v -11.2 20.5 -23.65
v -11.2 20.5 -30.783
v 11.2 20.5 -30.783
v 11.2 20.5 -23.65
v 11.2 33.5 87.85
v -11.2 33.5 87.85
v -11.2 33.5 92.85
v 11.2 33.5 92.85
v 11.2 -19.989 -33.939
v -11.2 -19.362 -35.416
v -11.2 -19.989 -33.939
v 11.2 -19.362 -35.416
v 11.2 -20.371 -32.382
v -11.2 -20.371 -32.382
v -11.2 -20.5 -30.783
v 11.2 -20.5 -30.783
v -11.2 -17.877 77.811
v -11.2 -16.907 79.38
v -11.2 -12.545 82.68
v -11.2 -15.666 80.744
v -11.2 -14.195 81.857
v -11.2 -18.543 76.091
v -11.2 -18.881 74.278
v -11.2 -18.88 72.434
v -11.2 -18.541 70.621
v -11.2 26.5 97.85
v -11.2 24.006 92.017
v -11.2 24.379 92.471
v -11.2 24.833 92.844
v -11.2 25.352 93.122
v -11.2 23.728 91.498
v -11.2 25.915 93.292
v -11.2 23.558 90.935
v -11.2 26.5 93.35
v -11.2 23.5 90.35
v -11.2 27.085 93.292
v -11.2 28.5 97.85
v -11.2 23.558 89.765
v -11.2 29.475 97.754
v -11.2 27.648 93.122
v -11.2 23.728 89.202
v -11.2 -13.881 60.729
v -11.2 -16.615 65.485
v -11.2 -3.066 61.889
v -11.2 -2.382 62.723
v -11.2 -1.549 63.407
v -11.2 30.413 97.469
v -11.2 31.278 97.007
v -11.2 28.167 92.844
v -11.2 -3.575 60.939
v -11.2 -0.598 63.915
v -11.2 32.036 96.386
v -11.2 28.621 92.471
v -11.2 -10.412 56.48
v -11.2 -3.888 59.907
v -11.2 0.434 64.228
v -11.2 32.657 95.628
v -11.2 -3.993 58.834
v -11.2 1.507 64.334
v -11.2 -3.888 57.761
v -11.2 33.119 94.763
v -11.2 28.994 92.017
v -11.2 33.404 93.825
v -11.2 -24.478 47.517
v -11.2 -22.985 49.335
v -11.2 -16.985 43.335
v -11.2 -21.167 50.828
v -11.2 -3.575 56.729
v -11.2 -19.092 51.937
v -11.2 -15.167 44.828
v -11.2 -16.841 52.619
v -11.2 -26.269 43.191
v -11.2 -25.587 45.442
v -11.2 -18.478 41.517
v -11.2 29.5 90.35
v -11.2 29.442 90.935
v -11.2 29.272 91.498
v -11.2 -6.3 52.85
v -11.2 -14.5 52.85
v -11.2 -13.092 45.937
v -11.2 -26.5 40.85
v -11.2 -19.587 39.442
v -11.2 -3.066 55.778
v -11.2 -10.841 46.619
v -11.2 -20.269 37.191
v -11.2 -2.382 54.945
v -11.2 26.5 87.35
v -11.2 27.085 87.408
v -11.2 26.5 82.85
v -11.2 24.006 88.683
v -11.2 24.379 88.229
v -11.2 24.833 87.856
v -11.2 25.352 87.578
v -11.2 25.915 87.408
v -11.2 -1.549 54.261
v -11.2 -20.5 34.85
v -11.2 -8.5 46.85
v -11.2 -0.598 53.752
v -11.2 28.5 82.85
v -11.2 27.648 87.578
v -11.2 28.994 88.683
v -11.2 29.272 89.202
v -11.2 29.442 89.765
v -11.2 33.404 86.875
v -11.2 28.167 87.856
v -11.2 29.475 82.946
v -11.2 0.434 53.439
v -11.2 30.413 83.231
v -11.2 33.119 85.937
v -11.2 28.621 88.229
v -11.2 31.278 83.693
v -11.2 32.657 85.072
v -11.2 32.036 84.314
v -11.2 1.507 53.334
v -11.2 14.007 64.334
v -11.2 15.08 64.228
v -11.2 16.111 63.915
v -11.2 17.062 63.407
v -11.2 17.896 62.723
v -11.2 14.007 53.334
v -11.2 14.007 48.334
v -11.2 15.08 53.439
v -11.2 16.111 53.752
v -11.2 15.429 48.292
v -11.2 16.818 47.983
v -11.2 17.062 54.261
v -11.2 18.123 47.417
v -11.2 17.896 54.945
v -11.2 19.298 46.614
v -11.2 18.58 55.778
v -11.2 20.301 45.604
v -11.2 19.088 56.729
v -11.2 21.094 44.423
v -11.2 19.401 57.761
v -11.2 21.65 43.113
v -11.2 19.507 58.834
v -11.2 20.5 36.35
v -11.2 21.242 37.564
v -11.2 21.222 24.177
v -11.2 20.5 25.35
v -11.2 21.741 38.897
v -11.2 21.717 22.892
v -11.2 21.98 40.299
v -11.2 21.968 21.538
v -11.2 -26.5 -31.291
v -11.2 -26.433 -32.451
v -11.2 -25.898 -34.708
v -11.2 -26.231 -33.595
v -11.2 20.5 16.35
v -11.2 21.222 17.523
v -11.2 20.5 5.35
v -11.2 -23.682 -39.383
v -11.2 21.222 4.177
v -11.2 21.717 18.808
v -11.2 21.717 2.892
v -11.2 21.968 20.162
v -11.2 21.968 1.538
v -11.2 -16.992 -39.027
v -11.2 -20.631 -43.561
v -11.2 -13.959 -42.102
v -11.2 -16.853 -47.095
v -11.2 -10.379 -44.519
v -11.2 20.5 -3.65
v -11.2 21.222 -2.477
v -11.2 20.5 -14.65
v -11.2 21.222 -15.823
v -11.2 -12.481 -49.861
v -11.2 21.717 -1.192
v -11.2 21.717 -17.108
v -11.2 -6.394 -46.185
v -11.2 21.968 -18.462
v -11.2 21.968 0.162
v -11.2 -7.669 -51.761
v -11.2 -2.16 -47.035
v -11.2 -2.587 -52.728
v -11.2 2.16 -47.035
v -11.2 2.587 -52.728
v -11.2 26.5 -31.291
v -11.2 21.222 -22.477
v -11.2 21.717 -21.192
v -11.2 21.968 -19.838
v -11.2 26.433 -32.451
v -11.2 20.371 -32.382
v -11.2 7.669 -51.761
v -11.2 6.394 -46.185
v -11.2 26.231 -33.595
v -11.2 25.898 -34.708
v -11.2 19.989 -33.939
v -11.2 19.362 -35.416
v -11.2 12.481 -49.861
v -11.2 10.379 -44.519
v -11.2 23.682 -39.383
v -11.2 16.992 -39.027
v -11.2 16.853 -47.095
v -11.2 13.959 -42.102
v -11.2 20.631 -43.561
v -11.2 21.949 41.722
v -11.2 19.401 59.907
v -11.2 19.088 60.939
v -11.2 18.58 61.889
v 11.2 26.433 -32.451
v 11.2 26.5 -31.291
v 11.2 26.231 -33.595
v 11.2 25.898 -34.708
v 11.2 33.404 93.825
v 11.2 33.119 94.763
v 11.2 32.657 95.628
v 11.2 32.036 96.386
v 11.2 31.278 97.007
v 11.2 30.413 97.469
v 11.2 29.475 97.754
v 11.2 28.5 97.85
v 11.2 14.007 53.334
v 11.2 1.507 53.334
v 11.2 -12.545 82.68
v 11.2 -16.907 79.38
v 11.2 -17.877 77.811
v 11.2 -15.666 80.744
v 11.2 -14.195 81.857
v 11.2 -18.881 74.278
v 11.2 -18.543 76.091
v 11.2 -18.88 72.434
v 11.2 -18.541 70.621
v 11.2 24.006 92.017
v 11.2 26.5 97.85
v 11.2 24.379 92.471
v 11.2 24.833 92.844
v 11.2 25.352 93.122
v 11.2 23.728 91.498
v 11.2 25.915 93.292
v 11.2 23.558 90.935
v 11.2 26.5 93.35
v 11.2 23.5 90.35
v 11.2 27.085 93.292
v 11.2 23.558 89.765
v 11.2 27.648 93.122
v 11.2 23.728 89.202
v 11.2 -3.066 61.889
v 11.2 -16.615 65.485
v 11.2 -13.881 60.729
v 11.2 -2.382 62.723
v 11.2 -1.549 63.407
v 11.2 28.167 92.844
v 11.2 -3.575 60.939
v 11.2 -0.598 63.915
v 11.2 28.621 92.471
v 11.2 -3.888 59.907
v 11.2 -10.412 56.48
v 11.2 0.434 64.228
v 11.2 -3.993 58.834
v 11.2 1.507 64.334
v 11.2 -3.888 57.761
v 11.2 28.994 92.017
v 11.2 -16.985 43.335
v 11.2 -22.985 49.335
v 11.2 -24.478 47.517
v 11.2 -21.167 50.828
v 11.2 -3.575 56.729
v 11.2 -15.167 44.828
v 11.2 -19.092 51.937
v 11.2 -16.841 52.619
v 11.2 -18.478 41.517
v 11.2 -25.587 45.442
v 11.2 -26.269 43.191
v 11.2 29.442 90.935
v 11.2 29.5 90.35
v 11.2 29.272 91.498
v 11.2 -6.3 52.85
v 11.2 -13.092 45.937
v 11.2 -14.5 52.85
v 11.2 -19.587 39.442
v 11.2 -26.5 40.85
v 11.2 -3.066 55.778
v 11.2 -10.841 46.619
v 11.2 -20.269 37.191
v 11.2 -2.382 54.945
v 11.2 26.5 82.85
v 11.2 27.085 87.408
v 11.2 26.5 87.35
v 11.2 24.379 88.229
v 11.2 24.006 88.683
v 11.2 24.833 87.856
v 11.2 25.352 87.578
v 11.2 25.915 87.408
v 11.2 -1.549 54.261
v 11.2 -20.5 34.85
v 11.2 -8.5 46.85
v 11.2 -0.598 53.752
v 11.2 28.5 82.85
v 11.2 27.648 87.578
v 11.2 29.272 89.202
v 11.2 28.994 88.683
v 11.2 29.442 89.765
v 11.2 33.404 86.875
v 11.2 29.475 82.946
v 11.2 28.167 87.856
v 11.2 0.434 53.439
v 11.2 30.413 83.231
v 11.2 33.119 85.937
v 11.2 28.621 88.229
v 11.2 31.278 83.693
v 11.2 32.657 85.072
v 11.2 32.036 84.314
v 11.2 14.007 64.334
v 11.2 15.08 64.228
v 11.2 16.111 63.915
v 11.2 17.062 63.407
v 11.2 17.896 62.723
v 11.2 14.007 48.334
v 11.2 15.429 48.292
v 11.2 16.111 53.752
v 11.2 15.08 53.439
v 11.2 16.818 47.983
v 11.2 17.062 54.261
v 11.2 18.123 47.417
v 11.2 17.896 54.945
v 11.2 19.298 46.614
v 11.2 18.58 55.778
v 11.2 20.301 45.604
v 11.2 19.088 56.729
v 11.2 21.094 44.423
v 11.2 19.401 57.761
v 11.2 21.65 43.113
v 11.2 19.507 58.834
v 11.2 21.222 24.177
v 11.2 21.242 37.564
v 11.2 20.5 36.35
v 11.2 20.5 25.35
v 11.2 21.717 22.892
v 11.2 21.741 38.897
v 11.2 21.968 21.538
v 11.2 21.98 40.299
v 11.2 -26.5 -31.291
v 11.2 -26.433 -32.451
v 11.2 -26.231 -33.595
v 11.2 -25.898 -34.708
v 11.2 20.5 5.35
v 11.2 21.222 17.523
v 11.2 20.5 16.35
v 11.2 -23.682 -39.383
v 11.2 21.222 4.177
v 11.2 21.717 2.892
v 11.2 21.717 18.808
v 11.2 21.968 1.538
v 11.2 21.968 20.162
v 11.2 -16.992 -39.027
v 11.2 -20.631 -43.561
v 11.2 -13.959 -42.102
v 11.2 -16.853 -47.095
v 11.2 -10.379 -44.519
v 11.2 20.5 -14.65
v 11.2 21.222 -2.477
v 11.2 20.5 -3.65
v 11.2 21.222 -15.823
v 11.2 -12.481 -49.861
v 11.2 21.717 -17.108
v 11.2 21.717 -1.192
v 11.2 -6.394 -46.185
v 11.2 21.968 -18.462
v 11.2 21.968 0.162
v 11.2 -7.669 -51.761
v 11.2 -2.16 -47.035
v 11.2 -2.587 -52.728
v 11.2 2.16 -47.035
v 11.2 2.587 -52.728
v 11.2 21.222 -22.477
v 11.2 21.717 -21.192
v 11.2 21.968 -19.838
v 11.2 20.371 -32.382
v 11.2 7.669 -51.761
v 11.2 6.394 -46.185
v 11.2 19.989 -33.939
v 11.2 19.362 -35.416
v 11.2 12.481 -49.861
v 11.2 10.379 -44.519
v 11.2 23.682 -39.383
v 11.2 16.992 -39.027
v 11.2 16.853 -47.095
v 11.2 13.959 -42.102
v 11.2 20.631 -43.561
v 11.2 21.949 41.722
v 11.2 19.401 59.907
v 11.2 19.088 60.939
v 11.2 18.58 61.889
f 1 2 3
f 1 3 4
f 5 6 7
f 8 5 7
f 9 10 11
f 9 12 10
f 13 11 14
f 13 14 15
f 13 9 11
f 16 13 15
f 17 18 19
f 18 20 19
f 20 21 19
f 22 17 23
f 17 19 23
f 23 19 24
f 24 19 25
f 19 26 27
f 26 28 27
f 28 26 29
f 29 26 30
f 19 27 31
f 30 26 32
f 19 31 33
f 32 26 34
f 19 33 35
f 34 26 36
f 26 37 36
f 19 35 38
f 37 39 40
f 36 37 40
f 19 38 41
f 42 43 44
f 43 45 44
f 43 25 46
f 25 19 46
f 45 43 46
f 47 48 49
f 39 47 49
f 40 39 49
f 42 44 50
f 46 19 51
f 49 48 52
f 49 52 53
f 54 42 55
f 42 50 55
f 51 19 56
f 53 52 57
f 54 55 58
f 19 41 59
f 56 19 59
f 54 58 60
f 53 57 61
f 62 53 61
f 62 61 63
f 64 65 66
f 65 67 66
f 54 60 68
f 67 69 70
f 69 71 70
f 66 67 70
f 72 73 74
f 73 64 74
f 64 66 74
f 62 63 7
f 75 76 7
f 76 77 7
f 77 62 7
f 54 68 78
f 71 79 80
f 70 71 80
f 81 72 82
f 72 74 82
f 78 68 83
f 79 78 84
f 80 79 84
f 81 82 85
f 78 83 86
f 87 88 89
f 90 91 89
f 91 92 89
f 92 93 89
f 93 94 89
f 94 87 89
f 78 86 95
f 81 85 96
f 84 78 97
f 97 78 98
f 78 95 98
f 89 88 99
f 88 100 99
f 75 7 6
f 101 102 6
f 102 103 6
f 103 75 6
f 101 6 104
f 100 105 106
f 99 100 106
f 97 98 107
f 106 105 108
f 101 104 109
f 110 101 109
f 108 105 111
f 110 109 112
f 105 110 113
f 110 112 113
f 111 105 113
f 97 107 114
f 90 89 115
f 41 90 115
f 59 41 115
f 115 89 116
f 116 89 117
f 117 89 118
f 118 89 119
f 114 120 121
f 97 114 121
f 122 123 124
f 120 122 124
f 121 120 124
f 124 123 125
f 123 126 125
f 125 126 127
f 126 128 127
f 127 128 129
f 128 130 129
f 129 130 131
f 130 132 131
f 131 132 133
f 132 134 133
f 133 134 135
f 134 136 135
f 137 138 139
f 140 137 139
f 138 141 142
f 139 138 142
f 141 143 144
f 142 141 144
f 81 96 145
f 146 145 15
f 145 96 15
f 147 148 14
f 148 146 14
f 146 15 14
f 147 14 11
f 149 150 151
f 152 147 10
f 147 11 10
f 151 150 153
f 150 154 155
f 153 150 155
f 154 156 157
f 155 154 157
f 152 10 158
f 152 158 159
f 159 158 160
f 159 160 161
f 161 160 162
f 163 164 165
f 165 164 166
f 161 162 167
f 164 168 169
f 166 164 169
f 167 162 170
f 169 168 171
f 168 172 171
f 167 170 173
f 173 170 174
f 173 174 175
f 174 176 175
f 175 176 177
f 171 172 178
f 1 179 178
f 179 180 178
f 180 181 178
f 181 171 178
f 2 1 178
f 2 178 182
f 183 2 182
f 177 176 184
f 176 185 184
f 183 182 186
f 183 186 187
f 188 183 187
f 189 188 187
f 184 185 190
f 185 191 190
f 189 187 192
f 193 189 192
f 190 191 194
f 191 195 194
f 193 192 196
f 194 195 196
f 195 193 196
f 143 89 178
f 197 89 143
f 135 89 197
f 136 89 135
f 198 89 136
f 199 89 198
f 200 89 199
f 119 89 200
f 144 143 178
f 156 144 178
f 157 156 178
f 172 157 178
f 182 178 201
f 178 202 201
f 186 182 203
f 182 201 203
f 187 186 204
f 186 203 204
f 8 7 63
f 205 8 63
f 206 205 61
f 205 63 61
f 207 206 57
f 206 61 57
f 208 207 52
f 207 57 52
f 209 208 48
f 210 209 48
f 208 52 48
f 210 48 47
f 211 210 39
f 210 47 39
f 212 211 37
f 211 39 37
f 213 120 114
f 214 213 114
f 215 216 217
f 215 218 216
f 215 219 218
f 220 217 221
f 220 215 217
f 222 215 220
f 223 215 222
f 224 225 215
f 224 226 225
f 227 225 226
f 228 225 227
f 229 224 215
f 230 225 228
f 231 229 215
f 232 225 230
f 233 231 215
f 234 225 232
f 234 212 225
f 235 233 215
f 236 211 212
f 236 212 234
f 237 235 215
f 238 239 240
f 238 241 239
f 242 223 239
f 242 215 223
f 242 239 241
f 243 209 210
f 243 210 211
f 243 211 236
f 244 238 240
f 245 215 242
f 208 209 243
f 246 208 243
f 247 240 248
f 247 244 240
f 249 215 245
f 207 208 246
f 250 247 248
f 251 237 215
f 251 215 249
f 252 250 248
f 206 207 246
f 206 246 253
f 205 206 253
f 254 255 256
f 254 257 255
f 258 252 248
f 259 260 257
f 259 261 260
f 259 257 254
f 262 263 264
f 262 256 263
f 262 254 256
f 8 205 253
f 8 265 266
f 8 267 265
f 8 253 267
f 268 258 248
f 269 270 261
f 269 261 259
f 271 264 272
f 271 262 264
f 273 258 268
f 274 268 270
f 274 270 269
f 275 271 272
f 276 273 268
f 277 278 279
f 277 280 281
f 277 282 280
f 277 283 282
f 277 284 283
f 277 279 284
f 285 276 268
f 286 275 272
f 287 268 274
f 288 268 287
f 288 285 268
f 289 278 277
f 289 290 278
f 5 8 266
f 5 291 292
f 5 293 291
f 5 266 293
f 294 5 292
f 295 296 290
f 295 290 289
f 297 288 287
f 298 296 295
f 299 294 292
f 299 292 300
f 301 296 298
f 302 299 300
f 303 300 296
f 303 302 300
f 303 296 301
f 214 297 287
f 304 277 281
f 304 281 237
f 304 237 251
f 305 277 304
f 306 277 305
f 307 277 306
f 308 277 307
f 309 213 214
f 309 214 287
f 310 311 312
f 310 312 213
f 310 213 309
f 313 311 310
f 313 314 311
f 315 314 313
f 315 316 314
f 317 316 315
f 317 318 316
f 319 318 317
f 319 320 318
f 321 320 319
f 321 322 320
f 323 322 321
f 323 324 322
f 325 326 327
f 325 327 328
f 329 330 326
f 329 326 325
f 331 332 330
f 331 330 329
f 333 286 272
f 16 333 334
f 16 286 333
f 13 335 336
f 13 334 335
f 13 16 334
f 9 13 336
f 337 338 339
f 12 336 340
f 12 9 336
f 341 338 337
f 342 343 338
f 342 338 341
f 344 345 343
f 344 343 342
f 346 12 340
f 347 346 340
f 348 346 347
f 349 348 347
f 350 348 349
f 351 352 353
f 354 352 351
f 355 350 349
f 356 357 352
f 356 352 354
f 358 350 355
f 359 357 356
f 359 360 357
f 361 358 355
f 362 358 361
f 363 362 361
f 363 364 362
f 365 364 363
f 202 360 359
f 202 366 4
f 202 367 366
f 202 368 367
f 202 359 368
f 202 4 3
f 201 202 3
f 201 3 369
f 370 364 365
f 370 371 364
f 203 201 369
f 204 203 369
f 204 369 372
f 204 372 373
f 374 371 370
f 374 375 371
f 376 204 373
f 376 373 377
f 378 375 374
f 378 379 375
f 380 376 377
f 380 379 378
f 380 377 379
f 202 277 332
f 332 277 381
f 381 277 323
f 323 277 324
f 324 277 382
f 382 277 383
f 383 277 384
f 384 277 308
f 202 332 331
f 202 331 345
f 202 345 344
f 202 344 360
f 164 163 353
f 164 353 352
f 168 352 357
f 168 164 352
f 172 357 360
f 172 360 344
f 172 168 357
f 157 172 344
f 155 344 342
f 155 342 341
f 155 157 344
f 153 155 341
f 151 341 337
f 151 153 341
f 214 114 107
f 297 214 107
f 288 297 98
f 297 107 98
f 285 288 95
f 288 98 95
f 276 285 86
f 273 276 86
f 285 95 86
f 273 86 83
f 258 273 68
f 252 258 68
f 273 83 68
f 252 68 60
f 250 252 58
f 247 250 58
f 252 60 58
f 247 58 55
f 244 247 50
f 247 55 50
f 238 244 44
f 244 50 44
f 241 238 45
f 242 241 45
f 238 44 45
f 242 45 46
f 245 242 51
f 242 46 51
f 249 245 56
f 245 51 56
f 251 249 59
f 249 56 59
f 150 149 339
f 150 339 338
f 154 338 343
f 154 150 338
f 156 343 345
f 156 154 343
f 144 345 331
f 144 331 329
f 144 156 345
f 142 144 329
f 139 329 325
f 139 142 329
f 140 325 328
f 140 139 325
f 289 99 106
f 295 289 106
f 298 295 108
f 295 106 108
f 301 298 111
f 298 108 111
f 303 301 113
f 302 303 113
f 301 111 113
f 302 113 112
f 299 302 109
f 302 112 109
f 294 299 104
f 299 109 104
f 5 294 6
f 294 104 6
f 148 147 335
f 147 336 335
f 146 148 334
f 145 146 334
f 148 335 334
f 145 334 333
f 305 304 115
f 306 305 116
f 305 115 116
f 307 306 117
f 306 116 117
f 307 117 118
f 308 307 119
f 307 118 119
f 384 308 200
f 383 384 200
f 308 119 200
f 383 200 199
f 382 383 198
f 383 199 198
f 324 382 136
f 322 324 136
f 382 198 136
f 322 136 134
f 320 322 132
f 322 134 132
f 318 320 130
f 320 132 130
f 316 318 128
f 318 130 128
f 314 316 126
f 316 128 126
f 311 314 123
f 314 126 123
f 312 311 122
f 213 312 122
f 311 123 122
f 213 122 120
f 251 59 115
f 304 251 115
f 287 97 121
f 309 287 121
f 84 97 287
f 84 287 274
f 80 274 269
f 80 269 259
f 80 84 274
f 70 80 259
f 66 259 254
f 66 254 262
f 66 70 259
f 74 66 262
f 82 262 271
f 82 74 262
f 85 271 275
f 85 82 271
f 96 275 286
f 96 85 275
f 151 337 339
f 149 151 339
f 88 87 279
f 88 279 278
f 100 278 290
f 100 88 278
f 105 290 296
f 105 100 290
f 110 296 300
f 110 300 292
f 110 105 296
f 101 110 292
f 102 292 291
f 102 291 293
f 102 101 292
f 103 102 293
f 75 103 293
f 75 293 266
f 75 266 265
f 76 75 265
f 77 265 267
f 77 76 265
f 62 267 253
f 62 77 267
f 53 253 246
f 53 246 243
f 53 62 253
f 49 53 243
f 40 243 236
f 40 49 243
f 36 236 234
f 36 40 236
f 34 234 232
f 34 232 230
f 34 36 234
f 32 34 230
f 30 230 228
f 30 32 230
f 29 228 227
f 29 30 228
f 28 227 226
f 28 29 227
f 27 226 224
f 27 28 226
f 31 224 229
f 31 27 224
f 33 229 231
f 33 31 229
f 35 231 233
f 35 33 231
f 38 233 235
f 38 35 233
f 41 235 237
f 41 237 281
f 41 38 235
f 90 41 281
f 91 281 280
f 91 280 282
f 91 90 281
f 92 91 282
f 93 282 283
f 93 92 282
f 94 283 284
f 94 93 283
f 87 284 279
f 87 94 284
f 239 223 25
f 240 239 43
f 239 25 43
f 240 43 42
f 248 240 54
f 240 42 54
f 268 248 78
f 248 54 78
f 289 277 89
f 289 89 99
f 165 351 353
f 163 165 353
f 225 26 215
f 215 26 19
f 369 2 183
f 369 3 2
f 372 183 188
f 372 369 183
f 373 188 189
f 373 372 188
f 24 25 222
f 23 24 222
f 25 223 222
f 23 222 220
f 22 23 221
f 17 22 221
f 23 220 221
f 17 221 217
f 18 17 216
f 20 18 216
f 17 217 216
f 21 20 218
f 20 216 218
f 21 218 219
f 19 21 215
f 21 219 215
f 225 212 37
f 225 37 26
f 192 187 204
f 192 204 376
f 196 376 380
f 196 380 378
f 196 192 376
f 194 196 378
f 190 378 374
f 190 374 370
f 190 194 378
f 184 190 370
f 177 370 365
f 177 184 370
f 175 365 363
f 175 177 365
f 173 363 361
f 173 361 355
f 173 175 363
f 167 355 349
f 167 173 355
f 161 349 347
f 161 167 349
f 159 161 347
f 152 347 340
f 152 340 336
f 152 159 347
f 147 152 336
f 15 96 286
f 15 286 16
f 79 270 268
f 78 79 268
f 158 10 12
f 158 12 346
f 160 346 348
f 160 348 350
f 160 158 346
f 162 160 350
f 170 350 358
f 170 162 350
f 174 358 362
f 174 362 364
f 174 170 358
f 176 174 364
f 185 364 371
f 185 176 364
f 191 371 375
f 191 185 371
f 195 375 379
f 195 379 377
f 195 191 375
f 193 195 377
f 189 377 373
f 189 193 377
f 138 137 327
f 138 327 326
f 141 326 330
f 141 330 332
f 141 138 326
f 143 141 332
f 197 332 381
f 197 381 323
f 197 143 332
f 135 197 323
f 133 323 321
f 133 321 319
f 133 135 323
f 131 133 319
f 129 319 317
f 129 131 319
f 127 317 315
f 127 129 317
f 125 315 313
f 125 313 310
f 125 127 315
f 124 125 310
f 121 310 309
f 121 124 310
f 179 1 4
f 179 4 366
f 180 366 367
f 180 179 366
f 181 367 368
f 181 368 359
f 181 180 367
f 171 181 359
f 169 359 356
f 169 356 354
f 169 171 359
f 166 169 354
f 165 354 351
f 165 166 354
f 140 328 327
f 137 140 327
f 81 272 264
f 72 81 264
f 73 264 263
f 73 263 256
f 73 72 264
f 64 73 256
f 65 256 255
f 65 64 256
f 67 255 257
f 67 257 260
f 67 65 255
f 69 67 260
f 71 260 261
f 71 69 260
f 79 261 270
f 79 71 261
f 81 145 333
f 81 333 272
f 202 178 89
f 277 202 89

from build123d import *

# Parameters (mm, degrees)
BOSS_EXTRUDE1_DEPTH      = 11.2
BOSS_EXTRUDE1_DEPTH_BACK = 11.2
CUT_EXTRUDE1_START       = -11.2
SKETCH3_R                = 7.5
CUT_EXTRUDE1_DEPTH       = 22.4
FILLET1_R                = 10
CUT_EXTRUDE2_START       = -11.2
CUT_EXTRUDE2_DEPTH       = 22.4
FILLET2_R                = 10
BOSS_EXTRUDE2_START      = -11.2
BOSS_EXTRUDE2_DEPTH      = 22.4
FILLET3_R                = 10
CUT_EXTRUDE3_START       = -11.2
CUT_EXTRUDE3_DEPTH       = 22.4
CUT_EXTRUDE4_START       = -11.2
SKETCH7_R                = 3
CUT_EXTRUDE4_DEPTH       = 22.4


with BuildPart() as part:
    # Sketch2 → Boss-Extrude1 (new, two sides: drawn at the far end of the back side and taken through both)
    with BuildSketch(Plane(origin=(0, 0, 0), x_dir=(0, 0, -1), z_dir=(1, 0, 0)).offset(-BOSS_EXTRUDE1_DEPTH_BACK)):
        with BuildLine():
            Line((-52.85, 26.5), (32.85, 26.5))
            ThreePointArc((32.85, 26.5), (52.85, 0), (32.85, -26.5))
            Line((32.85, -26.5), (-40.85, -26.5))
            ThreePointArc((-40.85, -26.5), (-49.335281374, -22.985281374), (-52.85, -14.5))
            Line((-52.85, -14.5), (-52.85, 26.5))
        make_face()
        with BuildLine():
            Line((32.85, 20.5), (-40.85, 20.5))
            ThreePointArc((-40.85, 20.5), (-45.092640687, 18.742640687), (-46.85, 14.5))
            Line((-46.85, 14.5), (-46.85, -8.5))
            ThreePointArc((-46.85, -8.5), (-43.335281374, -16.985281374), (-34.85, -20.5))
            Line((-34.85, -20.5), (32.85, -20.5))
            ThreePointArc((32.85, -20.5), (47.142020276, 0), (32.85, 20.5))
        make_face(mode=Mode.SUBTRACT)
    extrude(amount=BOSS_EXTRUDE1_DEPTH + BOSS_EXTRUDE1_DEPTH_BACK)

    # Sketch3 → Cut-Extrude1 (cut)
    with BuildSketch(Plane(origin=(0, 0, 0), x_dir=(0, 0, -1), z_dir=(1, 0, 0)).offset(CUT_EXTRUDE1_START)):
        with Locations((-40.85, 14.5)):
            Circle(SKETCH3_R)
        with Locations((-20.85, 14.5)):
            Circle(SKETCH3_R)
        with Locations((-0.85, 14.5)):
            Circle(SKETCH3_R)
        with Locations((19.15, 14.5)):
            Circle(SKETCH3_R)
    extrude(amount=CUT_EXTRUDE1_DEPTH, mode=Mode.SUBTRACT)

    # Fillet1
    fillet1_edges = [part.edges().sort_by_distance(p)[0] for p in [
        (0, 20.5, -32.85),
    ]]
    fillet(fillet1_edges, radius=FILLET1_R)

    # Sketch4 → Cut-Extrude2 (cut)
    with BuildSketch(Plane(origin=(0, 0, 0), x_dir=(0, 0, -1), z_dir=(1, 0, 0)).offset(CUT_EXTRUDE2_START)):
        Polygon((-46.85, -8.5), (-48.333754922, 14.006631719), (-46.85, 14.006631719), align=None)
    extrude(amount=CUT_EXTRUDE2_DEPTH, mode=Mode.SUBTRACT)

    # Fillet2
    fillet2_edges = [part.edges().sort_by_distance(p)[0] for p in [
        (0, -20.5, -32.85),
        (0, 26.5, -32.85),
        (0, -26.5, -32.85),
    ]]
    fillet(fillet2_edges, radius=FILLET2_R)

    # Sketch5 → Boss-Extrude2 (add)
    with BuildSketch(Plane(origin=(0, 0, 0), x_dir=(0, 0, -1), z_dir=(1, 0, 0)).offset(BOSS_EXTRUDE2_START)):
        with BuildLine():
            Line((-52.85, -6.3), (-52.85, 26.5))
            Line((-52.85, 26.5), (-82.85, 26.5))
            Line((-82.85, 26.5), (-82.85, 28.5))
            ThreePointArc((-82.85, 28.5), (-84.314466094, 32.035533906), (-87.85, 33.5))
            Line((-87.85, 33.5), (-92.85, 33.5))
            ThreePointArc((-92.85, 33.5), (-96.385533906, 32.035533906), (-97.85, 28.5))
            Line((-97.85, 28.5), (-97.85, 26.5))
            Line((-97.85, 26.5), (-79.85, -19.82922762))
            ThreePointArc((-79.85, -19.82922762), (-64.75, -16.257700748), (-52.85, -6.3))
        make_face()
    extrude(amount=BOSS_EXTRUDE2_DEPTH)

    # Fillet3
    fillet3_edges = [part.edges().sort_by_distance(p)[0] for p in [
        (0, -19.82922762, 79.85),
    ]]
    fillet(fillet3_edges, radius=FILLET3_R)

    # Sketch6 → Cut-Extrude3 (cut)
    with BuildSketch(Plane(origin=(0, 0, 0), x_dir=(0, 0, -1), z_dir=(1, 0, 0)).offset(CUT_EXTRUDE3_START)):
        with BuildLine():
            Line((-53.333754922, 14.006631719), (-53.333754922, 1.506631719))
            ThreePointArc((-53.333754922, 1.506631719), (-58.833754922, -3.993368281), (-64.333754922, 1.506631719))
            Line((-64.333754922, 1.506631719), (-64.333754922, 14.006631719))
            ThreePointArc((-64.333754922, 14.006631719), (-58.833754922, 19.506631719), (-53.333754922, 14.006631719))
        make_face()
    extrude(amount=CUT_EXTRUDE3_DEPTH, mode=Mode.SUBTRACT)

    # Sketch7 → Cut-Extrude4 (cut)
    with BuildSketch(Plane(origin=(0, 0, 0), x_dir=(0, 0, -1), z_dir=(1, 0, 0)).offset(CUT_EXTRUDE4_START)):
        with Locations((-90.35, 26.5)):
            Circle(SKETCH7_R)
    extrude(amount=CUT_EXTRUDE4_DEPTH, mode=Mode.SUBTRACT)


solid = part.part
